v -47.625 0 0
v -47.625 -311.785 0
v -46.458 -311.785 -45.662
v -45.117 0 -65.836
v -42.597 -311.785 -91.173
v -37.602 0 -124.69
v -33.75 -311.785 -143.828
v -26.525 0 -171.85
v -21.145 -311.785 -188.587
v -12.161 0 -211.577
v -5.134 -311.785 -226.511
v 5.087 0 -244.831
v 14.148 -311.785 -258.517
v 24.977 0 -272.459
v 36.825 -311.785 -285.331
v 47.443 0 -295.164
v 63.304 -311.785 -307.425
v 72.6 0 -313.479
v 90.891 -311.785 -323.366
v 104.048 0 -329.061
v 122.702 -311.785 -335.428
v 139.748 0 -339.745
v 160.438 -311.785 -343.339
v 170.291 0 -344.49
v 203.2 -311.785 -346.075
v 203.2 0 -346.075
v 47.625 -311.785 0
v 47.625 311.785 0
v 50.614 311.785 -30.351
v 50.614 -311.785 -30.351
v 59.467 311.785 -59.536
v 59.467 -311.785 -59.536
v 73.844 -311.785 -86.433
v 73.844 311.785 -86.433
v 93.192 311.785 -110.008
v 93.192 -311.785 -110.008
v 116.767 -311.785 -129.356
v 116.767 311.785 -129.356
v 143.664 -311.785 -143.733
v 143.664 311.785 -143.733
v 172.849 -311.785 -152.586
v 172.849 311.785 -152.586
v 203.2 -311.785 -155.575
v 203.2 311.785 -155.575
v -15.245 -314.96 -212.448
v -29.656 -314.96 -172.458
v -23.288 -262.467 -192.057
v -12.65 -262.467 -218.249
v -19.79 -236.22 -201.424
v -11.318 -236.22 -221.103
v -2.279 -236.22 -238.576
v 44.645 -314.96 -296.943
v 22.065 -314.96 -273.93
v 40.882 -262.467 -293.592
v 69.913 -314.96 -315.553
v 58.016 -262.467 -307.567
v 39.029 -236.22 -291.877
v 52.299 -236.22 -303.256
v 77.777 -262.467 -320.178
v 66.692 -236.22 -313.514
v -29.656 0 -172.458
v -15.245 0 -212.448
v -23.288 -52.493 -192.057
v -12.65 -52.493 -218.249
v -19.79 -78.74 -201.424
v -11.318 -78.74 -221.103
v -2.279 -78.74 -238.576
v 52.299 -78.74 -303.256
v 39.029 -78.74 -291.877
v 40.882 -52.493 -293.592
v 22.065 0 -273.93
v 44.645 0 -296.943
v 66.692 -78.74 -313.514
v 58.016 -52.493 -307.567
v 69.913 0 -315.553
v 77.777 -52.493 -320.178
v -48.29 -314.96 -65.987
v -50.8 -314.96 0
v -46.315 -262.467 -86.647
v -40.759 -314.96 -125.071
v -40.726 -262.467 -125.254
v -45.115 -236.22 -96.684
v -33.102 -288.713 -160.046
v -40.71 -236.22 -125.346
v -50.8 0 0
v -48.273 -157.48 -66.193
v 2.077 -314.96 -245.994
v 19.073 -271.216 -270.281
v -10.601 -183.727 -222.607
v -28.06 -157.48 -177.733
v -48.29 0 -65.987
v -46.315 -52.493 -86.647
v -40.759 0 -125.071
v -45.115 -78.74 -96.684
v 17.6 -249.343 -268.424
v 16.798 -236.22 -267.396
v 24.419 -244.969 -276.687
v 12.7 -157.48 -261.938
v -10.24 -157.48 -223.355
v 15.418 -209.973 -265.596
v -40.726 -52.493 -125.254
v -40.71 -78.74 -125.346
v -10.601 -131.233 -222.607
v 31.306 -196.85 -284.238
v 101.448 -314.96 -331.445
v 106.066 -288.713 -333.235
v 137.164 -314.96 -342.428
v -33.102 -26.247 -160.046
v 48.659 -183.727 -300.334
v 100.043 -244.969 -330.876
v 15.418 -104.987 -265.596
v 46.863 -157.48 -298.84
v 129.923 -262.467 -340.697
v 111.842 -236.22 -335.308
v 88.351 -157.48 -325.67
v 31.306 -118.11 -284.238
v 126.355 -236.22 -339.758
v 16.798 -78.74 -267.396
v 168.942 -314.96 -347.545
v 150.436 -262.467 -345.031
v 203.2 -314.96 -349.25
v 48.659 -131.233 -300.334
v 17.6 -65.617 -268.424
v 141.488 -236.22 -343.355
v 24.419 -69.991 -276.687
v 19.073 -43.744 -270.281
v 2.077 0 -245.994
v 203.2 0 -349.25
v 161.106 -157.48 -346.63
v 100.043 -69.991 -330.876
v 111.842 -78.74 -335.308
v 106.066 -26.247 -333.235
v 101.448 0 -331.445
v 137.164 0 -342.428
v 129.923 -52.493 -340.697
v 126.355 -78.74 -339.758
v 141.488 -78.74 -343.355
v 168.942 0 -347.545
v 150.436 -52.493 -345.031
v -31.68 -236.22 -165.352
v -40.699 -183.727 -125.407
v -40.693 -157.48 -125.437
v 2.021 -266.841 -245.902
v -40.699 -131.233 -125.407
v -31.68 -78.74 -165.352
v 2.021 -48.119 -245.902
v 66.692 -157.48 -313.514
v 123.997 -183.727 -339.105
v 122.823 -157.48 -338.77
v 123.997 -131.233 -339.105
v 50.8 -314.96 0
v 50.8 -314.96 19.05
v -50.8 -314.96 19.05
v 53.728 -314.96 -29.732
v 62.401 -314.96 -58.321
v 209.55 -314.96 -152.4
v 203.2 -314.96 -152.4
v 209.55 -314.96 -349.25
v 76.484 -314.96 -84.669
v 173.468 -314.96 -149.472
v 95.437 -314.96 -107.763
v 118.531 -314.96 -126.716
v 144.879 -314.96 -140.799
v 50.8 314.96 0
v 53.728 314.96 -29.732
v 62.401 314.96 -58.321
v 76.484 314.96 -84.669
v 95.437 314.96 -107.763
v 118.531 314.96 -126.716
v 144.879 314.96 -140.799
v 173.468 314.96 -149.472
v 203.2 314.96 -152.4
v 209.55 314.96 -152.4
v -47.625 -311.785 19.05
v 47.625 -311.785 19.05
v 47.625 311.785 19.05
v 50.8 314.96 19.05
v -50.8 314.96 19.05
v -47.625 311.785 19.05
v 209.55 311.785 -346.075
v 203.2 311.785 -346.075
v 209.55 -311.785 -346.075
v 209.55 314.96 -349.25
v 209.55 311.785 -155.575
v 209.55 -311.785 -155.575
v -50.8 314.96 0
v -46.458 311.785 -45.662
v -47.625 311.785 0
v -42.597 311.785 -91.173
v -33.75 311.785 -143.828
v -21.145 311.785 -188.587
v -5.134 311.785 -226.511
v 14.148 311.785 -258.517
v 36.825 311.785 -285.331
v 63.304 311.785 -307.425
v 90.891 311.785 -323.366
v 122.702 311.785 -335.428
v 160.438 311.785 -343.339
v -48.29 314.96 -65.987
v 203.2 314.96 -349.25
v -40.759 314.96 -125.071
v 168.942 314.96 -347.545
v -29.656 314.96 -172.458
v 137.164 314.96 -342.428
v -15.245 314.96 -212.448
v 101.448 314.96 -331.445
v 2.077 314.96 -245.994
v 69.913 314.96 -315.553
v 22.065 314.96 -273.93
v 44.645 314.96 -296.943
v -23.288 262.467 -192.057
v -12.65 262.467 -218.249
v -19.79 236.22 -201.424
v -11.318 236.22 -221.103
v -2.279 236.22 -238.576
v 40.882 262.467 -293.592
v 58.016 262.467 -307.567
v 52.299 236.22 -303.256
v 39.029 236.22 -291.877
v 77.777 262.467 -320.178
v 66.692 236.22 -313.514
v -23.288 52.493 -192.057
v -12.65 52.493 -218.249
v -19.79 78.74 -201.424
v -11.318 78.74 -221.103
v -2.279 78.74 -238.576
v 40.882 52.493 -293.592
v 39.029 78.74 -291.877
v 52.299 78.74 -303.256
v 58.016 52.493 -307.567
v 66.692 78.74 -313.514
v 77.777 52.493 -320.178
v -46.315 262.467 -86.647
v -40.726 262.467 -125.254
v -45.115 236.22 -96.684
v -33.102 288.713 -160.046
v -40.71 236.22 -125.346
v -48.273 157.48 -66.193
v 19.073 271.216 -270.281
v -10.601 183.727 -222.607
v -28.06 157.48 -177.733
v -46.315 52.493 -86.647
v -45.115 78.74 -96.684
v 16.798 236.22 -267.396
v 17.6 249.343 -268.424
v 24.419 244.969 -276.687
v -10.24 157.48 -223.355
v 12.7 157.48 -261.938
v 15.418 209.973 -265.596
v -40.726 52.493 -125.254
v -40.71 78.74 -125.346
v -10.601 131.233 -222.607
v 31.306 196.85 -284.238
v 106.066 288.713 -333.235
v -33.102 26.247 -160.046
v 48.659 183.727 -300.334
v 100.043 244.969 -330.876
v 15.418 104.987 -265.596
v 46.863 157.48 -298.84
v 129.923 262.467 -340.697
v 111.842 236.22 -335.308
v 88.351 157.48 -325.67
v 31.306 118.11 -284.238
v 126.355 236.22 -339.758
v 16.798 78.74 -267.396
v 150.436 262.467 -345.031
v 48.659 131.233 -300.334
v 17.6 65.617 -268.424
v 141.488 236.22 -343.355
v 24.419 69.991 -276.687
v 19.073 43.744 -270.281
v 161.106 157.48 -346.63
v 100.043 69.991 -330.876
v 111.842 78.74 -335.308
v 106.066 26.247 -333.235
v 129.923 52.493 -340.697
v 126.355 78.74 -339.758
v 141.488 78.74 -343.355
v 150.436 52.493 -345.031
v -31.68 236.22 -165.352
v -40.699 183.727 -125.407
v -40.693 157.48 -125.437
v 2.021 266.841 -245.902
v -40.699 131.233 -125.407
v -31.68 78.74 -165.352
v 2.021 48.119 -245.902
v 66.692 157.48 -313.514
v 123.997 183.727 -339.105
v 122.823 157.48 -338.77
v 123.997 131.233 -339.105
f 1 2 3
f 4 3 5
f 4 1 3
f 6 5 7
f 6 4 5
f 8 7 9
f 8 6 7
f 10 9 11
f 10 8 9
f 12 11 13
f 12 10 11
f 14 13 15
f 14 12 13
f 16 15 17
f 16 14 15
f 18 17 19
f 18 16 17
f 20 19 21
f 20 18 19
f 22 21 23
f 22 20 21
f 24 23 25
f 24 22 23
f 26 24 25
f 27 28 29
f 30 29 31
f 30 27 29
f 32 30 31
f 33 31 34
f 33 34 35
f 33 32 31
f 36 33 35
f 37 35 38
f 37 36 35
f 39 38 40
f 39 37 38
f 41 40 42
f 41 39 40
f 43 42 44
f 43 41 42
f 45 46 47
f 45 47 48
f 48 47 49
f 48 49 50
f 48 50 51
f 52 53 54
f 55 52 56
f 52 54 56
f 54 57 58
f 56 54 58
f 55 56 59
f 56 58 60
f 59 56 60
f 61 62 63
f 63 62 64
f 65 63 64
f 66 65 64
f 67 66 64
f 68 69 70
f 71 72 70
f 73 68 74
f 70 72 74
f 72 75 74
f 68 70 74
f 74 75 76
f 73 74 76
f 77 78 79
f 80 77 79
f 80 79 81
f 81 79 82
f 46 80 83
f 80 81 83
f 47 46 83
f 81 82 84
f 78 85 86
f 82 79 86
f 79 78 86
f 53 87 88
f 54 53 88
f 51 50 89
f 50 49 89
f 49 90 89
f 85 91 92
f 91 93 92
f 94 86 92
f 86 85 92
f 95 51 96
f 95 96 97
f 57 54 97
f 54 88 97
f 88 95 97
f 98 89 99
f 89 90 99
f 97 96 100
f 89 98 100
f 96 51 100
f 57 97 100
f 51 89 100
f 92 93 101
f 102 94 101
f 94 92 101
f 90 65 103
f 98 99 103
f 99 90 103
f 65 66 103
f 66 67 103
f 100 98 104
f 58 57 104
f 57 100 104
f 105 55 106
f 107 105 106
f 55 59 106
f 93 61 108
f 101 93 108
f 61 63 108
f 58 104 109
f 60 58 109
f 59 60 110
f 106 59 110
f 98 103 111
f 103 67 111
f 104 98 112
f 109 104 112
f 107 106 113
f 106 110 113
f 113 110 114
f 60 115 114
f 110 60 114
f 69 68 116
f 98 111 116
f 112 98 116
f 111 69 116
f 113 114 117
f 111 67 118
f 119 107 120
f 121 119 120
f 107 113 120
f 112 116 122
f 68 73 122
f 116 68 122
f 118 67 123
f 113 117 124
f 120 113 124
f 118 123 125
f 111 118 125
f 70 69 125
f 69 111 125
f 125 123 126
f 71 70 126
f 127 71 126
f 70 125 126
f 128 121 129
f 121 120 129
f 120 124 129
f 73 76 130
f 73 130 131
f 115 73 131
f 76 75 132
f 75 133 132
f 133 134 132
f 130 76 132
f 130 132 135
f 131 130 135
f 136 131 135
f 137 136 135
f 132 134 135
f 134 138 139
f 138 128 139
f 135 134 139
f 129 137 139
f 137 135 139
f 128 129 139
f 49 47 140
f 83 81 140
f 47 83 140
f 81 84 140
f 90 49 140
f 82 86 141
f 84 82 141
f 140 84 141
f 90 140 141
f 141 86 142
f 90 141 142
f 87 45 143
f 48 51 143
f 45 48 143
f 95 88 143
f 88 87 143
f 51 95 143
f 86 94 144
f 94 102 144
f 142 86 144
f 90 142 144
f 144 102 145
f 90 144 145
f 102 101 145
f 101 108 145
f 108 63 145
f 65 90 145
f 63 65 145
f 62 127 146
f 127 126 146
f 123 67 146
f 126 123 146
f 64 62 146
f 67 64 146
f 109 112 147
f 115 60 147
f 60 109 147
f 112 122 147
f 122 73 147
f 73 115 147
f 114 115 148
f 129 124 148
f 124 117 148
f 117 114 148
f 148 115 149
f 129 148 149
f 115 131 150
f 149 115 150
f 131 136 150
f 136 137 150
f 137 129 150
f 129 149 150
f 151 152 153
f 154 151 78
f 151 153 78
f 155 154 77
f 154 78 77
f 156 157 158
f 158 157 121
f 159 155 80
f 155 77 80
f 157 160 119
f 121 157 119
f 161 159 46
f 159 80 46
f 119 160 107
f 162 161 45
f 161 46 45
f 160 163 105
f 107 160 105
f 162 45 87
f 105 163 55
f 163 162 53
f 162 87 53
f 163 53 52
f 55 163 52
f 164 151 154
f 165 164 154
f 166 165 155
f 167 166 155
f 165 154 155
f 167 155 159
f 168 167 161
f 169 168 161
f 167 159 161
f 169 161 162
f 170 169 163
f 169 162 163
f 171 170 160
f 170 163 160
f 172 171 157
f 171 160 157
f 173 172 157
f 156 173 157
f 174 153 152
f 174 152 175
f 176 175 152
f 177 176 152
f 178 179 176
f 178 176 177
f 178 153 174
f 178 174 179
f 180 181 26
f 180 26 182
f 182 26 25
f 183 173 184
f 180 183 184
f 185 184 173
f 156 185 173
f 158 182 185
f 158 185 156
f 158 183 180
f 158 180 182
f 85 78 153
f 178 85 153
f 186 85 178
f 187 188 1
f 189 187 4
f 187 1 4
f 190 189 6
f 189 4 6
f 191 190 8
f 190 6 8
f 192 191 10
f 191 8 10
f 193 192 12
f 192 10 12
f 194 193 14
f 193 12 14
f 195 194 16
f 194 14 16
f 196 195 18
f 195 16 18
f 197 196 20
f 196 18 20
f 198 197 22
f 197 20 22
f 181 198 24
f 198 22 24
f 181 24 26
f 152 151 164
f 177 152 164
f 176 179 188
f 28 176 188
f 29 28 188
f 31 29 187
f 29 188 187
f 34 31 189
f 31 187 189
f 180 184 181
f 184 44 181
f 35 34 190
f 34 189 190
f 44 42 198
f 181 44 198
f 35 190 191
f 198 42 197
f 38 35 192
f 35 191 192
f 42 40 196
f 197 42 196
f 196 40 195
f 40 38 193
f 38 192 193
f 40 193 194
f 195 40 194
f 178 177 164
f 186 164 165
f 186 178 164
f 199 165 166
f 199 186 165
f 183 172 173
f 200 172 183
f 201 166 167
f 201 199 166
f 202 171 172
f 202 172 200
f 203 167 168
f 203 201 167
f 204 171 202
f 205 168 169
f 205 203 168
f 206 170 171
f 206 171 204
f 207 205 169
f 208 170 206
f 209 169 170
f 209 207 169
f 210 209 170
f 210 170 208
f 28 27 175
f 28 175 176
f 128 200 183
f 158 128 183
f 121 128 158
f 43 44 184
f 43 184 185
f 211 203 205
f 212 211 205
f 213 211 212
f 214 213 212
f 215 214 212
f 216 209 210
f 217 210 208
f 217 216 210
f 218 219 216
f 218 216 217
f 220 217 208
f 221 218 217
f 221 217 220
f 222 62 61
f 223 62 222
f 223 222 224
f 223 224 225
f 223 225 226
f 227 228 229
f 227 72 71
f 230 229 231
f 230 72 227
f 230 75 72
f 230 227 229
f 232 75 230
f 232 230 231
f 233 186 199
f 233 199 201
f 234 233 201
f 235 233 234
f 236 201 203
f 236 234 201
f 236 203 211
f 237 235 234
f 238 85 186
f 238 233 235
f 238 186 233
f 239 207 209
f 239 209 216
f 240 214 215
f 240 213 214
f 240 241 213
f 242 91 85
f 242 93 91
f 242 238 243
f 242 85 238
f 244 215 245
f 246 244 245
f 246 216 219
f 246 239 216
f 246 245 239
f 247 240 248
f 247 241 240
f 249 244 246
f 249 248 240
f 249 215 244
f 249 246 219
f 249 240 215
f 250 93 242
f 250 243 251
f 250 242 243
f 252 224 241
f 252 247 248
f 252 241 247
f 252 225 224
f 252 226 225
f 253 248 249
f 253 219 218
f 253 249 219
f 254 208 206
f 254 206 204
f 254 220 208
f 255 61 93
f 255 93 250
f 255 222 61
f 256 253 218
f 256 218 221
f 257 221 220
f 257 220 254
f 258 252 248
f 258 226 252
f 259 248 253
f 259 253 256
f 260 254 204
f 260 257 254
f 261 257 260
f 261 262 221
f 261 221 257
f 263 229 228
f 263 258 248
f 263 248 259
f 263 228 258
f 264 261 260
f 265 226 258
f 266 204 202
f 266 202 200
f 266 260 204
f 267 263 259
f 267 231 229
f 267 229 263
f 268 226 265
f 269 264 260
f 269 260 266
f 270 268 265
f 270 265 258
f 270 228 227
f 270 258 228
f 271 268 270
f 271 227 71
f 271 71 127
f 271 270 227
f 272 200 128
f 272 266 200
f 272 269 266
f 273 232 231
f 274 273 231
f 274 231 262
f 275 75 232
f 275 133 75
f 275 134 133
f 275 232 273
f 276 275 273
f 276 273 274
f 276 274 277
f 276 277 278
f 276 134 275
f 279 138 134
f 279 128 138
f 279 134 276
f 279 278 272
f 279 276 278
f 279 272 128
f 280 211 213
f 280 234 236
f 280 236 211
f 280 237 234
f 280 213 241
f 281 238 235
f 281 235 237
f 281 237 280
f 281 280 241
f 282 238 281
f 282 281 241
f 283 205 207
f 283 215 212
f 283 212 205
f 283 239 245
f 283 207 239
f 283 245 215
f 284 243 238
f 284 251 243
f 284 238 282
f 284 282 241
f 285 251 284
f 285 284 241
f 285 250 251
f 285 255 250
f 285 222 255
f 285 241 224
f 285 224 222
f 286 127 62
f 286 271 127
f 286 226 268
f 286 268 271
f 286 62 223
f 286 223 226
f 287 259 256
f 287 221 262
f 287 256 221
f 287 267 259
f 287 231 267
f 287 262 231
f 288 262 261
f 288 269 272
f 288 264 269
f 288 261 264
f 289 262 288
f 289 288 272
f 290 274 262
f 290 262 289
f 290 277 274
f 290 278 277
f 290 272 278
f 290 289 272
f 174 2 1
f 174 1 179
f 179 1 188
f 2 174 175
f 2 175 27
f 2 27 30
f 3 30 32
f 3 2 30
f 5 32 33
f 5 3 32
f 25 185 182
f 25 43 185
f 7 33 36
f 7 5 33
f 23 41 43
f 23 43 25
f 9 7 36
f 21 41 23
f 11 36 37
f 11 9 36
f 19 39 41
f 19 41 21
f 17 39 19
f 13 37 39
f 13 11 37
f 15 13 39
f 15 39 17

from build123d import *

# Parameters (mm, degrees)
PAD_DEPTH      = 314.96
PAD_FACE4_W    = 629.92
PAD_FACE4_H    = 101.6
PAD001_DEPTH   = 19.05
PAD001_FACE3_W = 629.92
PAD001_FACE3_H = 196.85
PAD002_DEPTH   = 6.35
THICKNESS_T    = -3.175


with BuildPart() as part:
    # Sketch001 → Pad (new body, symmetric)
    with BuildSketch(Plane.XZ):
        with BuildLine():
            ThreePointArc((50.8, 0), (95.436927, -107.763073), (203.2, -152.4))
            Line((203.2, -152.4), (203.2, -349.25))
            add(Edge.make_bspline(
                [(-50.8, 0), (-50.8, -349.25), (203.2, -349.25)],
                knots=[0, 0, 0, 1, 1, 1], degree=2))
            Line((-50.8, 0), (50.8, 0))
        make_face()
    extrude(amount=PAD_DEPTH, both=True)

    # Pad Face4 → Pad001 (add)
    with BuildSketch(Plane(origin=(0, 0, 0), x_dir=(0, 1, 0), z_dir=(0, 0, 1))):
        Rectangle(PAD_FACE4_W, PAD_FACE4_H)
    extrude(amount=PAD001_DEPTH)

    # Pad001 Face3 → Pad002 (add)
    with BuildSketch(Plane(origin=(203.2, 0, -250.825), x_dir=(0, -1, 0), z_dir=(1, 0, 0))):
        Rectangle(PAD001_FACE3_W, PAD001_FACE3_H)
    extrude(amount=PAD002_DEPTH)

    # Thickness
    thickness_openings = [part.faces().sort_by_distance(p)[0] for p in [
        (0, 0, 19.05),
        (209.55, 0, -250.825),
    ]]
    offset(amount=THICKNESS_T, openings=thickness_openings)


solid = part.part
